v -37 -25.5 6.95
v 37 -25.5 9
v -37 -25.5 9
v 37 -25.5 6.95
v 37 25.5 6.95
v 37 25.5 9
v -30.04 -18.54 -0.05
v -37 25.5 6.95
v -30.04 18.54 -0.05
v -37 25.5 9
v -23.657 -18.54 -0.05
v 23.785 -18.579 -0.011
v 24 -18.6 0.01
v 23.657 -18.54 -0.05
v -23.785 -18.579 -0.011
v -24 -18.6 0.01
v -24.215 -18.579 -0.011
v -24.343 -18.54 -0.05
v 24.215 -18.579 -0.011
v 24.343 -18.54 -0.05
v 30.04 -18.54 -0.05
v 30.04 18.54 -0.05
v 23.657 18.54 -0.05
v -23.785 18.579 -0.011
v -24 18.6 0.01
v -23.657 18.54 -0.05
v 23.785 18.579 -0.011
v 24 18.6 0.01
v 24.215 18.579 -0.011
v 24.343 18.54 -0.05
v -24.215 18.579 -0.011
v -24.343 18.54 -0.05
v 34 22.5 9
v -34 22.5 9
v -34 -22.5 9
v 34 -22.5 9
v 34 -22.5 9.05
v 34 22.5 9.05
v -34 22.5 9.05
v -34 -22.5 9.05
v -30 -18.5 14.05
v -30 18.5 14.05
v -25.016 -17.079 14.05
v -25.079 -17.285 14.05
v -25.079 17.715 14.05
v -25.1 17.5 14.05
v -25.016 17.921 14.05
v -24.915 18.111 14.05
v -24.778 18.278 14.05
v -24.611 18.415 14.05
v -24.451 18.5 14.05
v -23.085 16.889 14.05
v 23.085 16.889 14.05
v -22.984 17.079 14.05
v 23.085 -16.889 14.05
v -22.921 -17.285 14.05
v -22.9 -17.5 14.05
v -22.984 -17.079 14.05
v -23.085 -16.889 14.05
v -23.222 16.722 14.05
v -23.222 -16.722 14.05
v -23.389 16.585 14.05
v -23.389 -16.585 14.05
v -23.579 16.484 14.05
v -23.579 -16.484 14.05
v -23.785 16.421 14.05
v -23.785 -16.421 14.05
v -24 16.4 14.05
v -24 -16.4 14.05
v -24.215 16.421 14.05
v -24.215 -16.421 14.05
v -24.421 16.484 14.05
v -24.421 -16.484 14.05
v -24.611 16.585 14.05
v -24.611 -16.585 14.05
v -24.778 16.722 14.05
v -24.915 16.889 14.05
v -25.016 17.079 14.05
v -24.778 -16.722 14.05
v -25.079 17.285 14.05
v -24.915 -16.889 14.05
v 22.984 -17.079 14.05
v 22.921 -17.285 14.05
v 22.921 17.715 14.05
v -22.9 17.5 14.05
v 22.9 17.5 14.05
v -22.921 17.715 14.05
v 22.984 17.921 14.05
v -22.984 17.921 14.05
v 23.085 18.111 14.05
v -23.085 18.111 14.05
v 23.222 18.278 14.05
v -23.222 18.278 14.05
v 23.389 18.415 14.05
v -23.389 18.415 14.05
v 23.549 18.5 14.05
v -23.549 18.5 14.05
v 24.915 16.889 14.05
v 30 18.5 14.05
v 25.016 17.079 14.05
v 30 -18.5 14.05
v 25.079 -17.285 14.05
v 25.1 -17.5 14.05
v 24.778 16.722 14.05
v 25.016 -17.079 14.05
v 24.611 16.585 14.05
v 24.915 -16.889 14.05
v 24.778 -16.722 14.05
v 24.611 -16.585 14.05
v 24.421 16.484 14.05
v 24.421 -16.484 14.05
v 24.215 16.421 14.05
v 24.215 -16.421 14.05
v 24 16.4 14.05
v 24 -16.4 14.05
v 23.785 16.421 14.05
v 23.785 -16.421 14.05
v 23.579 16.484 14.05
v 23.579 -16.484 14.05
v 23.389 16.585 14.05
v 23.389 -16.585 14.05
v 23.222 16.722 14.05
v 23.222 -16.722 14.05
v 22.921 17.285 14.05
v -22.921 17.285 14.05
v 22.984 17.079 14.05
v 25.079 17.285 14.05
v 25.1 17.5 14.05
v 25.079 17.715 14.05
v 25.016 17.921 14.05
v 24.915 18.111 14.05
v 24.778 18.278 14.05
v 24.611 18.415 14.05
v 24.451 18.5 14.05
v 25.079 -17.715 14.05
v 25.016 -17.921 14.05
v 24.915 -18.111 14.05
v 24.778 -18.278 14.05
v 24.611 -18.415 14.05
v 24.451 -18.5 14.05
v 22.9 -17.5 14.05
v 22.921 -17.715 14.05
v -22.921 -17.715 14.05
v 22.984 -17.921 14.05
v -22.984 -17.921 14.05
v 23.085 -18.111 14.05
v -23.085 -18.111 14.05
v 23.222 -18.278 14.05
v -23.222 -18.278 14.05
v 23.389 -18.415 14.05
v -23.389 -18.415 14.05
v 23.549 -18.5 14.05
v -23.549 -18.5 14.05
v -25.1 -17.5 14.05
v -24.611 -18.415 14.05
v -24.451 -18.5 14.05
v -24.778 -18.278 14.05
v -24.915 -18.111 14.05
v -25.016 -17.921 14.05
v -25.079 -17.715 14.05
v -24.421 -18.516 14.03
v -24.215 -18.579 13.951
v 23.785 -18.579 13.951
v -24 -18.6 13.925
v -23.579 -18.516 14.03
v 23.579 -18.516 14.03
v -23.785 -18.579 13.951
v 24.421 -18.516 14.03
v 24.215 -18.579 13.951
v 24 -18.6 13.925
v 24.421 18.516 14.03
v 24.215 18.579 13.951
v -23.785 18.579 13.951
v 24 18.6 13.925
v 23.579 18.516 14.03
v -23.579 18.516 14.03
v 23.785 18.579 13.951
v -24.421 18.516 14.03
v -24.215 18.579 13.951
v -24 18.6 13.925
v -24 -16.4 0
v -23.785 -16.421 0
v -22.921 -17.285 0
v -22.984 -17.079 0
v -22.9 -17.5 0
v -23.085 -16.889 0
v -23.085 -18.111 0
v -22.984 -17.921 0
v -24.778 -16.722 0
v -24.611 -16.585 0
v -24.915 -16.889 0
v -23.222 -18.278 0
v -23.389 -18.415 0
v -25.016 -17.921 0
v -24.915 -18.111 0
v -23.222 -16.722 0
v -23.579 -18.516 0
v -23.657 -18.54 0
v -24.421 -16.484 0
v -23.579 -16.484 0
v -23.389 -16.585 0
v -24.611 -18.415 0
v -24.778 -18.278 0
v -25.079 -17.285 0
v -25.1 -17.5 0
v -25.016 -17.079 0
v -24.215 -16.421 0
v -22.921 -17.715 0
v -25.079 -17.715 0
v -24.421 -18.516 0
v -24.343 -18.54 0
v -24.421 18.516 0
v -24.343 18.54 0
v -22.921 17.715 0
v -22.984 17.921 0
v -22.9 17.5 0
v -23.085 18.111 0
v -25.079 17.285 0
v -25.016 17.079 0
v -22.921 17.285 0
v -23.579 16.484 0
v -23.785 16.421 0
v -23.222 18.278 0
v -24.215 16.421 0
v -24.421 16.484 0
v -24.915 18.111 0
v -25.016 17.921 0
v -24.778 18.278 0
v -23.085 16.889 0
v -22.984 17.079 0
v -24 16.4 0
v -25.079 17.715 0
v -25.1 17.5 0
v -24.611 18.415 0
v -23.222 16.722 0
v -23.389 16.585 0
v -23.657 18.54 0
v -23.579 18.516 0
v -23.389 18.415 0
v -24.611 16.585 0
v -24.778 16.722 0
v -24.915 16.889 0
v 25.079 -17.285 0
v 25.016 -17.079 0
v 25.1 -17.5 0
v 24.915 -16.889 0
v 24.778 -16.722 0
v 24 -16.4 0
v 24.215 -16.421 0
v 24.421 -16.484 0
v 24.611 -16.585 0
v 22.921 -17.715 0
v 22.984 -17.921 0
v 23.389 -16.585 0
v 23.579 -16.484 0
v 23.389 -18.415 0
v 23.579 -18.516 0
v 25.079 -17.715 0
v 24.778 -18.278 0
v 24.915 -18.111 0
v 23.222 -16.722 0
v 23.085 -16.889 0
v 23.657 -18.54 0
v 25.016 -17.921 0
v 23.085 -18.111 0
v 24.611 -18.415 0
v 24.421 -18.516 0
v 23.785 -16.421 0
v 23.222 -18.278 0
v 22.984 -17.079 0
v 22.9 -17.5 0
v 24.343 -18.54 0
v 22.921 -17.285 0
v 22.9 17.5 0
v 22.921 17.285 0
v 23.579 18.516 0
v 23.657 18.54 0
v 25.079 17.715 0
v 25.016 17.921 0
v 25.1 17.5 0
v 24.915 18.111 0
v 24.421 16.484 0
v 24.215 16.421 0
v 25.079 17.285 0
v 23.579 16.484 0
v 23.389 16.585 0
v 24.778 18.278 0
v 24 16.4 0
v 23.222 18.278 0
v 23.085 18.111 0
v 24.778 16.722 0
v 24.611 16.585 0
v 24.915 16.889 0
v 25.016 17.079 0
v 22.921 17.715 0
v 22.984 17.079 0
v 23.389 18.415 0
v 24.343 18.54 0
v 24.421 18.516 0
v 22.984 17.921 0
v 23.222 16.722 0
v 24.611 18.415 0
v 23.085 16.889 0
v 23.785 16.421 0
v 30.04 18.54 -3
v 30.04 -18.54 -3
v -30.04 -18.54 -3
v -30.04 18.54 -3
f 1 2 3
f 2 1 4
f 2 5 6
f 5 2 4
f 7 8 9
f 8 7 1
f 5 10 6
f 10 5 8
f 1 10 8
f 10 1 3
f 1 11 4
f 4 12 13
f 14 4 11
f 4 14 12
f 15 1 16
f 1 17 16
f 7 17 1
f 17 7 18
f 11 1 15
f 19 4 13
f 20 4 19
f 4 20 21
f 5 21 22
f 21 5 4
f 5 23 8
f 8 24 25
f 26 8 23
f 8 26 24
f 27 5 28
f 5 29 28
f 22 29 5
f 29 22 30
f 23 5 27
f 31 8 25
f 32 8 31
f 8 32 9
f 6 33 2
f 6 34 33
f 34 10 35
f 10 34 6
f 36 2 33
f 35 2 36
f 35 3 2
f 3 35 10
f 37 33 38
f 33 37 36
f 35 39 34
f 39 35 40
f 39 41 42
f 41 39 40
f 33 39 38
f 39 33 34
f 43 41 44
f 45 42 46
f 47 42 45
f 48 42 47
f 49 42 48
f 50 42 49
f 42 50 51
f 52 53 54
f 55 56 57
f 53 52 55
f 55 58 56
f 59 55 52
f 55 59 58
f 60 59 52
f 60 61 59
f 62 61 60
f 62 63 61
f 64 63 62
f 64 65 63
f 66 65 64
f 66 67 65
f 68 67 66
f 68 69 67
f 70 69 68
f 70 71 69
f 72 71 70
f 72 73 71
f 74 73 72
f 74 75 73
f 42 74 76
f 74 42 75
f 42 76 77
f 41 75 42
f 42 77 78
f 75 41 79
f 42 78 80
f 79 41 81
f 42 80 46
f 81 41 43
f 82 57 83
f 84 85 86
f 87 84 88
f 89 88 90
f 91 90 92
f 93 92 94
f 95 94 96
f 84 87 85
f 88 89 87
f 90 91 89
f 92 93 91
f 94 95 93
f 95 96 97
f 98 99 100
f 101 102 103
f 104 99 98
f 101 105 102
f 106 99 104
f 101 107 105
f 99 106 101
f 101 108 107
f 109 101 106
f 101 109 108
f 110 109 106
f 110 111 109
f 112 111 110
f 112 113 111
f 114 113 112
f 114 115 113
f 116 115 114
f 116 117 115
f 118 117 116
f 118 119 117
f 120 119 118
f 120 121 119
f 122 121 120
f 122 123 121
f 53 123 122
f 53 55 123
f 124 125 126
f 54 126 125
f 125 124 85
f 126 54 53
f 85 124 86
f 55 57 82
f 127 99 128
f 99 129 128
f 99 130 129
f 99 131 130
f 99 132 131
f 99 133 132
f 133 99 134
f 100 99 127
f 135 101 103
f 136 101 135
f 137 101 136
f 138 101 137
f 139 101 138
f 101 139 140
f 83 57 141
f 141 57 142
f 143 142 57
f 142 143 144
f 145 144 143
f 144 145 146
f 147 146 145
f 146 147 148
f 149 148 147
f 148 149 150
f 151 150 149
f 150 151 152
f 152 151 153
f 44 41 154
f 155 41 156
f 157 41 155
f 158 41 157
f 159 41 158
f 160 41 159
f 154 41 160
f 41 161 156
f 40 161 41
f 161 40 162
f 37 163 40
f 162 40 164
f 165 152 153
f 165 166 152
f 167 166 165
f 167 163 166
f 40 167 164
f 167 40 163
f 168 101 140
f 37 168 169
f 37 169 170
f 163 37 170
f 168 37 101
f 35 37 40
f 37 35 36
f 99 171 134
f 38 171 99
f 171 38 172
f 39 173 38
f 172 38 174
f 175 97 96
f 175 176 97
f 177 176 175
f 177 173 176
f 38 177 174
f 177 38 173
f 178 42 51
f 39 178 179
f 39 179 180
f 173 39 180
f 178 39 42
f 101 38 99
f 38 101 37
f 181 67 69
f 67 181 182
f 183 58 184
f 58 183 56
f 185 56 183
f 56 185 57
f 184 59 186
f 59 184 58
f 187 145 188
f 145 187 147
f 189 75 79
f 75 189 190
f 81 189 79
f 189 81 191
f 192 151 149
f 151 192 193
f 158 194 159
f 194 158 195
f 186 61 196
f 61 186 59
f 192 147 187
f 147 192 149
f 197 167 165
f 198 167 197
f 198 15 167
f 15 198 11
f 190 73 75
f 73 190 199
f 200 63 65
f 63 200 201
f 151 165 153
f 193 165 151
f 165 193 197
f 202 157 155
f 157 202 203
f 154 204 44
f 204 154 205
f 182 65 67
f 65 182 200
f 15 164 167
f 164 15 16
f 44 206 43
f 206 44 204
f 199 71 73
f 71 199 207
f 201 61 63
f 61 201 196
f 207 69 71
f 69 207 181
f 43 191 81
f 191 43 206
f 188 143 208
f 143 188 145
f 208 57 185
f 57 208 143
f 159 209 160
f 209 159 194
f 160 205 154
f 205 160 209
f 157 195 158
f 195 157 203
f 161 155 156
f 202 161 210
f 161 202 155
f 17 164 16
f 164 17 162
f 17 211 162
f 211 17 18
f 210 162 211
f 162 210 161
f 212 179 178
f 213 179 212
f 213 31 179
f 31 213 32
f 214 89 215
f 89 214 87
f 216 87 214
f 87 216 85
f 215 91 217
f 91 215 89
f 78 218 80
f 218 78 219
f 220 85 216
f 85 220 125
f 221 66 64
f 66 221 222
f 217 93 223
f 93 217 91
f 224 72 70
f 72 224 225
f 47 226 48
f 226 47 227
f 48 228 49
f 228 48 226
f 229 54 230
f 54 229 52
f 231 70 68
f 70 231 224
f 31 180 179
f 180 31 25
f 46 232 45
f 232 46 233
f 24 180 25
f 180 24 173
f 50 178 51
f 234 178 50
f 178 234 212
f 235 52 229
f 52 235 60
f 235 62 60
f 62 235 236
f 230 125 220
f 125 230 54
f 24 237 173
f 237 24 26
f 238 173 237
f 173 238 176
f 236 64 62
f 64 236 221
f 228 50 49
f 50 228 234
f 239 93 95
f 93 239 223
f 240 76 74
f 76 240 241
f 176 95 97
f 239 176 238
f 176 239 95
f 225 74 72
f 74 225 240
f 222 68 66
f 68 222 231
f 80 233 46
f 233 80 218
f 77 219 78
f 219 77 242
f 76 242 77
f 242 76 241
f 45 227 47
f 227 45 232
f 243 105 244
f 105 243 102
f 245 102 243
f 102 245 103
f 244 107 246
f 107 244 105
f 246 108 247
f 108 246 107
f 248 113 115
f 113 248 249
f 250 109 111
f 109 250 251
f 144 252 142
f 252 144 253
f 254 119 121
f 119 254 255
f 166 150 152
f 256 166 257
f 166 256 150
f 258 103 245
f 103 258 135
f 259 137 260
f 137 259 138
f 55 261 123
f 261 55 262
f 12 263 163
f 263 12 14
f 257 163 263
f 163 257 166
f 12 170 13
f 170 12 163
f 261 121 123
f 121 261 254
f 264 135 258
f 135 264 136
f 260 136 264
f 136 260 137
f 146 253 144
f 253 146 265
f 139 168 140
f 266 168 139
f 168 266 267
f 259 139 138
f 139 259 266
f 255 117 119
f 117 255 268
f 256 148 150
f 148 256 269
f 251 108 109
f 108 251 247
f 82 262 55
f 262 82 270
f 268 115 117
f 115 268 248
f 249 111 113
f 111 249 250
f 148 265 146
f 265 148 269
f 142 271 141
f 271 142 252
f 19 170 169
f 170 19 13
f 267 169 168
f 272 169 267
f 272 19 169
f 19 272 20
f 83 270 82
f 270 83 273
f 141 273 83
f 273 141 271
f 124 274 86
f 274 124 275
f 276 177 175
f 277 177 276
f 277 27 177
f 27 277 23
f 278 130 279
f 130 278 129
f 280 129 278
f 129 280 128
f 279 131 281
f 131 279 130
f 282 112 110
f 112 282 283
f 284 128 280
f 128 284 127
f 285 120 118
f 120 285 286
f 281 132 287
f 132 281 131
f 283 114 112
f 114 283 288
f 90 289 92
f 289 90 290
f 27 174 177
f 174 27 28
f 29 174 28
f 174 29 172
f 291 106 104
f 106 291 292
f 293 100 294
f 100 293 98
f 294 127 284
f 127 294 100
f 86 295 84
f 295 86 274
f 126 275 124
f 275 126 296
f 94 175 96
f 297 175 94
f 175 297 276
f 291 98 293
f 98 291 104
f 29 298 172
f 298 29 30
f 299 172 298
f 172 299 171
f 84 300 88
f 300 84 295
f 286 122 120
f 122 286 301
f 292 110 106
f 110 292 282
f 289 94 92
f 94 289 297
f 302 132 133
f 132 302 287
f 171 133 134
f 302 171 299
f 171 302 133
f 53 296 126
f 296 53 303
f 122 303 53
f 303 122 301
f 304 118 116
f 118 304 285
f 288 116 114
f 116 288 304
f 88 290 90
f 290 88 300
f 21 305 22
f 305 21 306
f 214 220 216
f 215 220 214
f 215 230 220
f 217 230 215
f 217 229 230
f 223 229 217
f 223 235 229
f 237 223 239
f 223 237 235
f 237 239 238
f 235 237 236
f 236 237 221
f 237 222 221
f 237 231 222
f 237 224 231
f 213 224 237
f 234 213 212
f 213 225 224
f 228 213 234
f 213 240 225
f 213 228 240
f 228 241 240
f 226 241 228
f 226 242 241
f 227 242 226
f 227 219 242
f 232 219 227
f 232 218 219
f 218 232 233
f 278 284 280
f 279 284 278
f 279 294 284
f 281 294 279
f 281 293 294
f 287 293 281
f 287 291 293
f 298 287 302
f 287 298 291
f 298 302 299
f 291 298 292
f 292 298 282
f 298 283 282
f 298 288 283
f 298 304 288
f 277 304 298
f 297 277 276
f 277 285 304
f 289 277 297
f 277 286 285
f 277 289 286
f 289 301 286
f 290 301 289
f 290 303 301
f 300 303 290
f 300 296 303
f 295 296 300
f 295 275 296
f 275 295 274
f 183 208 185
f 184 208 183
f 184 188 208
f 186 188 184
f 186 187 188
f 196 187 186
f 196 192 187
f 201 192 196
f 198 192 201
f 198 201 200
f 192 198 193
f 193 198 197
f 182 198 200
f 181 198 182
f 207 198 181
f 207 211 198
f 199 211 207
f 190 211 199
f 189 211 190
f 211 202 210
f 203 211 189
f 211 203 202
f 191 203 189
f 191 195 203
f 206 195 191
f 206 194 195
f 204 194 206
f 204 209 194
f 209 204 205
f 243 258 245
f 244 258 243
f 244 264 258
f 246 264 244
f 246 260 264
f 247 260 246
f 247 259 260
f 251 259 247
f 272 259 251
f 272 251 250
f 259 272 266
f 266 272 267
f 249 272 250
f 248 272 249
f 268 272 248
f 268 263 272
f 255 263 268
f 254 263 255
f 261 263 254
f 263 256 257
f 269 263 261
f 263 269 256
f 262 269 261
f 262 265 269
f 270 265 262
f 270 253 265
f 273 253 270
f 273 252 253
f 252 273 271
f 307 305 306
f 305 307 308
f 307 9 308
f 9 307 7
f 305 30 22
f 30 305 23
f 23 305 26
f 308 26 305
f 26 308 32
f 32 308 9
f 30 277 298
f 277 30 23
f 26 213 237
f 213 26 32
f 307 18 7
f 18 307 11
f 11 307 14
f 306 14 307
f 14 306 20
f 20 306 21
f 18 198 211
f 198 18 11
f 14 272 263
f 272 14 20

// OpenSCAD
// file: params.scad
//////////////////////////////////////////////////////////////
// Meridian Presence Node — Shared Parameters
// Single source of truth. Both presence_node and lid files
// `include` this — edit values here, not in either file.
//////////////////////////////////////////////////////////////

// --- LD2410B module (35 x 7 x 7.4 mm) ---
ld_len   = 35;
ld_wid   = 7;
ld_thick = 7.4;

// --- Enclosure body ---
body_width  = 68;   // widened from 60 — see battery note below
body_depth  = 45;
body_height = 55;
wall        = 3.66;

// --- Sensor window (derived from LD2410B size) ---
window_width  = ld_len + 6;
window_height = ld_wid + 6;

// --- PVC saddle mount ---
bolt_circle_d = 36;
screw_hole_d  = 1.6;
clearance     = 0.6;

// --- Battery: actual 2000mAh unit measured at 56 x 34 x 11mm.
// The old 50 x 30 x 8 guess was too small in every dimension —
// 56mm length in particular exceeded the old interior width
// (55.2mm) outright, not just the bay's margin. body_width
// went 60 -> 68 to give this real clearance (63.2mm interior,
// ~1.6mm clear on each side of the battery with the bay's
// existing +4mm margin formula, instead of a razor-thin fit).
bat_len   = 56;
bat_wid   = 34;
bat_thick = 11;
// main file
//////////////////////////////////////////////////////////////
// LD2410B Presence Node — LID v0.4
// Standalone file — print this separately from the body.
//
// Fixes the floating-cantilever warning from v0.3: the plug
// (54.6 x 39.6) used to jump straight to the brim (66 x 51) in
// one step — a 5.7mm unsupported overhang. Now there's a
// sloped taper between them, tall enough to print without
// support. Lid is ~7mm taller overall as a result.
//
// Dimensions come from params.scad — keep all three files
// (params.scad, presence_node_v0.5.scad, lid.scad) together.
//////////////////////////////////////////////////////////////
include <params.scad>

// --- Lid-specific ---
brim_overhang = 3;    // how far the brim extends past the body, each side
taper_h       = 7;    // height of the ramp from plug width up to brim width
                       // (>= the overhang distance, for a printable slope)
brim_h        = 2;    // thickness of the flat brim ledge
dome_h        = 5;    // height of the tapered cap above the brim
dome_inset    = 4;    // how much narrower the cap top is, each side
                       // (kept small so screw holes stay inside material
                       // at the very top — see lid() comments below)
step_h        = 3;    // depth of the plug that drops into the body opening
step_gap      = 0.6;  // clearance so the plug slides in without jamming

module lid() {
    plug_w = body_width - 2*wall - step_gap;
    plug_d = body_depth - 2*wall - step_gap;
    brim_w = body_width + 2*brim_overhang;
    brim_d = body_depth + 2*brim_overhang;

    union() {
        // --- Plug: straight-walled, drops into the body opening ---
        // Left solid (not holed) — screws don't need to reach down here,
        // they thread into the body's bosses near the top edge.
        translate([0, 0, -step_h/2])
            cube([plug_w, plug_d, step_h], center = true);

        // --- Everything from the top of the plug upward gets the screw holes ---
        difference() {
            union() {
                // Ramp: gradual taper from plug width up to brim width.
                // Height (taper_h) is sized so the ~5.7mm radial growth
                // happens over enough vertical distance to print without
                // support (roughly 40 deg from vertical here).
                hull() {
                    cube([plug_w, plug_d, 0.1], center = true);
                    translate([0, 0, taper_h])
                        cube([brim_w, brim_d, 0.1], center = true);
                }

                // Flat brim ledge at full width — this is the drip edge
                translate([0, 0, taper_h + brim_h/2])
                    cube([brim_w, brim_d, brim_h], center = true);

                // Cap: steps inward to the body footprint (safe, smaller
                // sitting on larger), then tapers further to a small top
                translate([0, 0, taper_h + brim_h])
                    hull() {
                        cube([body_width, body_depth, 0.1], center = true);
                        translate([0, 0, dome_h])
                            cube([body_width - 2*dome_inset,
                                  body_depth - 2*dome_inset,
                                  0.1], center = true);
                    }
            }
            // Corner screw holes, aligned to the body's lid_bosses()
            // (cx = body_width/2 - 10, cy = body_depth/2 - 5 — must
            // match the body file exactly or the screws won't land).
            // Run from just above the plug through the top of the cap.
            for (x = [-1, 1])
                for (y = [-1, 1])
                    translate([x * (body_width/2 - 10),
                               y * (body_depth/2 - 5),
                               (taper_h + brim_h + dome_h)/2])
                        cylinder(h = taper_h + brim_h + dome_h + 4,
                                 d = screw_hole_d + clearance,
                                 $fn = 32, center = true);
        }
    }
}

// Render — without this line, nothing prints.
lid();
